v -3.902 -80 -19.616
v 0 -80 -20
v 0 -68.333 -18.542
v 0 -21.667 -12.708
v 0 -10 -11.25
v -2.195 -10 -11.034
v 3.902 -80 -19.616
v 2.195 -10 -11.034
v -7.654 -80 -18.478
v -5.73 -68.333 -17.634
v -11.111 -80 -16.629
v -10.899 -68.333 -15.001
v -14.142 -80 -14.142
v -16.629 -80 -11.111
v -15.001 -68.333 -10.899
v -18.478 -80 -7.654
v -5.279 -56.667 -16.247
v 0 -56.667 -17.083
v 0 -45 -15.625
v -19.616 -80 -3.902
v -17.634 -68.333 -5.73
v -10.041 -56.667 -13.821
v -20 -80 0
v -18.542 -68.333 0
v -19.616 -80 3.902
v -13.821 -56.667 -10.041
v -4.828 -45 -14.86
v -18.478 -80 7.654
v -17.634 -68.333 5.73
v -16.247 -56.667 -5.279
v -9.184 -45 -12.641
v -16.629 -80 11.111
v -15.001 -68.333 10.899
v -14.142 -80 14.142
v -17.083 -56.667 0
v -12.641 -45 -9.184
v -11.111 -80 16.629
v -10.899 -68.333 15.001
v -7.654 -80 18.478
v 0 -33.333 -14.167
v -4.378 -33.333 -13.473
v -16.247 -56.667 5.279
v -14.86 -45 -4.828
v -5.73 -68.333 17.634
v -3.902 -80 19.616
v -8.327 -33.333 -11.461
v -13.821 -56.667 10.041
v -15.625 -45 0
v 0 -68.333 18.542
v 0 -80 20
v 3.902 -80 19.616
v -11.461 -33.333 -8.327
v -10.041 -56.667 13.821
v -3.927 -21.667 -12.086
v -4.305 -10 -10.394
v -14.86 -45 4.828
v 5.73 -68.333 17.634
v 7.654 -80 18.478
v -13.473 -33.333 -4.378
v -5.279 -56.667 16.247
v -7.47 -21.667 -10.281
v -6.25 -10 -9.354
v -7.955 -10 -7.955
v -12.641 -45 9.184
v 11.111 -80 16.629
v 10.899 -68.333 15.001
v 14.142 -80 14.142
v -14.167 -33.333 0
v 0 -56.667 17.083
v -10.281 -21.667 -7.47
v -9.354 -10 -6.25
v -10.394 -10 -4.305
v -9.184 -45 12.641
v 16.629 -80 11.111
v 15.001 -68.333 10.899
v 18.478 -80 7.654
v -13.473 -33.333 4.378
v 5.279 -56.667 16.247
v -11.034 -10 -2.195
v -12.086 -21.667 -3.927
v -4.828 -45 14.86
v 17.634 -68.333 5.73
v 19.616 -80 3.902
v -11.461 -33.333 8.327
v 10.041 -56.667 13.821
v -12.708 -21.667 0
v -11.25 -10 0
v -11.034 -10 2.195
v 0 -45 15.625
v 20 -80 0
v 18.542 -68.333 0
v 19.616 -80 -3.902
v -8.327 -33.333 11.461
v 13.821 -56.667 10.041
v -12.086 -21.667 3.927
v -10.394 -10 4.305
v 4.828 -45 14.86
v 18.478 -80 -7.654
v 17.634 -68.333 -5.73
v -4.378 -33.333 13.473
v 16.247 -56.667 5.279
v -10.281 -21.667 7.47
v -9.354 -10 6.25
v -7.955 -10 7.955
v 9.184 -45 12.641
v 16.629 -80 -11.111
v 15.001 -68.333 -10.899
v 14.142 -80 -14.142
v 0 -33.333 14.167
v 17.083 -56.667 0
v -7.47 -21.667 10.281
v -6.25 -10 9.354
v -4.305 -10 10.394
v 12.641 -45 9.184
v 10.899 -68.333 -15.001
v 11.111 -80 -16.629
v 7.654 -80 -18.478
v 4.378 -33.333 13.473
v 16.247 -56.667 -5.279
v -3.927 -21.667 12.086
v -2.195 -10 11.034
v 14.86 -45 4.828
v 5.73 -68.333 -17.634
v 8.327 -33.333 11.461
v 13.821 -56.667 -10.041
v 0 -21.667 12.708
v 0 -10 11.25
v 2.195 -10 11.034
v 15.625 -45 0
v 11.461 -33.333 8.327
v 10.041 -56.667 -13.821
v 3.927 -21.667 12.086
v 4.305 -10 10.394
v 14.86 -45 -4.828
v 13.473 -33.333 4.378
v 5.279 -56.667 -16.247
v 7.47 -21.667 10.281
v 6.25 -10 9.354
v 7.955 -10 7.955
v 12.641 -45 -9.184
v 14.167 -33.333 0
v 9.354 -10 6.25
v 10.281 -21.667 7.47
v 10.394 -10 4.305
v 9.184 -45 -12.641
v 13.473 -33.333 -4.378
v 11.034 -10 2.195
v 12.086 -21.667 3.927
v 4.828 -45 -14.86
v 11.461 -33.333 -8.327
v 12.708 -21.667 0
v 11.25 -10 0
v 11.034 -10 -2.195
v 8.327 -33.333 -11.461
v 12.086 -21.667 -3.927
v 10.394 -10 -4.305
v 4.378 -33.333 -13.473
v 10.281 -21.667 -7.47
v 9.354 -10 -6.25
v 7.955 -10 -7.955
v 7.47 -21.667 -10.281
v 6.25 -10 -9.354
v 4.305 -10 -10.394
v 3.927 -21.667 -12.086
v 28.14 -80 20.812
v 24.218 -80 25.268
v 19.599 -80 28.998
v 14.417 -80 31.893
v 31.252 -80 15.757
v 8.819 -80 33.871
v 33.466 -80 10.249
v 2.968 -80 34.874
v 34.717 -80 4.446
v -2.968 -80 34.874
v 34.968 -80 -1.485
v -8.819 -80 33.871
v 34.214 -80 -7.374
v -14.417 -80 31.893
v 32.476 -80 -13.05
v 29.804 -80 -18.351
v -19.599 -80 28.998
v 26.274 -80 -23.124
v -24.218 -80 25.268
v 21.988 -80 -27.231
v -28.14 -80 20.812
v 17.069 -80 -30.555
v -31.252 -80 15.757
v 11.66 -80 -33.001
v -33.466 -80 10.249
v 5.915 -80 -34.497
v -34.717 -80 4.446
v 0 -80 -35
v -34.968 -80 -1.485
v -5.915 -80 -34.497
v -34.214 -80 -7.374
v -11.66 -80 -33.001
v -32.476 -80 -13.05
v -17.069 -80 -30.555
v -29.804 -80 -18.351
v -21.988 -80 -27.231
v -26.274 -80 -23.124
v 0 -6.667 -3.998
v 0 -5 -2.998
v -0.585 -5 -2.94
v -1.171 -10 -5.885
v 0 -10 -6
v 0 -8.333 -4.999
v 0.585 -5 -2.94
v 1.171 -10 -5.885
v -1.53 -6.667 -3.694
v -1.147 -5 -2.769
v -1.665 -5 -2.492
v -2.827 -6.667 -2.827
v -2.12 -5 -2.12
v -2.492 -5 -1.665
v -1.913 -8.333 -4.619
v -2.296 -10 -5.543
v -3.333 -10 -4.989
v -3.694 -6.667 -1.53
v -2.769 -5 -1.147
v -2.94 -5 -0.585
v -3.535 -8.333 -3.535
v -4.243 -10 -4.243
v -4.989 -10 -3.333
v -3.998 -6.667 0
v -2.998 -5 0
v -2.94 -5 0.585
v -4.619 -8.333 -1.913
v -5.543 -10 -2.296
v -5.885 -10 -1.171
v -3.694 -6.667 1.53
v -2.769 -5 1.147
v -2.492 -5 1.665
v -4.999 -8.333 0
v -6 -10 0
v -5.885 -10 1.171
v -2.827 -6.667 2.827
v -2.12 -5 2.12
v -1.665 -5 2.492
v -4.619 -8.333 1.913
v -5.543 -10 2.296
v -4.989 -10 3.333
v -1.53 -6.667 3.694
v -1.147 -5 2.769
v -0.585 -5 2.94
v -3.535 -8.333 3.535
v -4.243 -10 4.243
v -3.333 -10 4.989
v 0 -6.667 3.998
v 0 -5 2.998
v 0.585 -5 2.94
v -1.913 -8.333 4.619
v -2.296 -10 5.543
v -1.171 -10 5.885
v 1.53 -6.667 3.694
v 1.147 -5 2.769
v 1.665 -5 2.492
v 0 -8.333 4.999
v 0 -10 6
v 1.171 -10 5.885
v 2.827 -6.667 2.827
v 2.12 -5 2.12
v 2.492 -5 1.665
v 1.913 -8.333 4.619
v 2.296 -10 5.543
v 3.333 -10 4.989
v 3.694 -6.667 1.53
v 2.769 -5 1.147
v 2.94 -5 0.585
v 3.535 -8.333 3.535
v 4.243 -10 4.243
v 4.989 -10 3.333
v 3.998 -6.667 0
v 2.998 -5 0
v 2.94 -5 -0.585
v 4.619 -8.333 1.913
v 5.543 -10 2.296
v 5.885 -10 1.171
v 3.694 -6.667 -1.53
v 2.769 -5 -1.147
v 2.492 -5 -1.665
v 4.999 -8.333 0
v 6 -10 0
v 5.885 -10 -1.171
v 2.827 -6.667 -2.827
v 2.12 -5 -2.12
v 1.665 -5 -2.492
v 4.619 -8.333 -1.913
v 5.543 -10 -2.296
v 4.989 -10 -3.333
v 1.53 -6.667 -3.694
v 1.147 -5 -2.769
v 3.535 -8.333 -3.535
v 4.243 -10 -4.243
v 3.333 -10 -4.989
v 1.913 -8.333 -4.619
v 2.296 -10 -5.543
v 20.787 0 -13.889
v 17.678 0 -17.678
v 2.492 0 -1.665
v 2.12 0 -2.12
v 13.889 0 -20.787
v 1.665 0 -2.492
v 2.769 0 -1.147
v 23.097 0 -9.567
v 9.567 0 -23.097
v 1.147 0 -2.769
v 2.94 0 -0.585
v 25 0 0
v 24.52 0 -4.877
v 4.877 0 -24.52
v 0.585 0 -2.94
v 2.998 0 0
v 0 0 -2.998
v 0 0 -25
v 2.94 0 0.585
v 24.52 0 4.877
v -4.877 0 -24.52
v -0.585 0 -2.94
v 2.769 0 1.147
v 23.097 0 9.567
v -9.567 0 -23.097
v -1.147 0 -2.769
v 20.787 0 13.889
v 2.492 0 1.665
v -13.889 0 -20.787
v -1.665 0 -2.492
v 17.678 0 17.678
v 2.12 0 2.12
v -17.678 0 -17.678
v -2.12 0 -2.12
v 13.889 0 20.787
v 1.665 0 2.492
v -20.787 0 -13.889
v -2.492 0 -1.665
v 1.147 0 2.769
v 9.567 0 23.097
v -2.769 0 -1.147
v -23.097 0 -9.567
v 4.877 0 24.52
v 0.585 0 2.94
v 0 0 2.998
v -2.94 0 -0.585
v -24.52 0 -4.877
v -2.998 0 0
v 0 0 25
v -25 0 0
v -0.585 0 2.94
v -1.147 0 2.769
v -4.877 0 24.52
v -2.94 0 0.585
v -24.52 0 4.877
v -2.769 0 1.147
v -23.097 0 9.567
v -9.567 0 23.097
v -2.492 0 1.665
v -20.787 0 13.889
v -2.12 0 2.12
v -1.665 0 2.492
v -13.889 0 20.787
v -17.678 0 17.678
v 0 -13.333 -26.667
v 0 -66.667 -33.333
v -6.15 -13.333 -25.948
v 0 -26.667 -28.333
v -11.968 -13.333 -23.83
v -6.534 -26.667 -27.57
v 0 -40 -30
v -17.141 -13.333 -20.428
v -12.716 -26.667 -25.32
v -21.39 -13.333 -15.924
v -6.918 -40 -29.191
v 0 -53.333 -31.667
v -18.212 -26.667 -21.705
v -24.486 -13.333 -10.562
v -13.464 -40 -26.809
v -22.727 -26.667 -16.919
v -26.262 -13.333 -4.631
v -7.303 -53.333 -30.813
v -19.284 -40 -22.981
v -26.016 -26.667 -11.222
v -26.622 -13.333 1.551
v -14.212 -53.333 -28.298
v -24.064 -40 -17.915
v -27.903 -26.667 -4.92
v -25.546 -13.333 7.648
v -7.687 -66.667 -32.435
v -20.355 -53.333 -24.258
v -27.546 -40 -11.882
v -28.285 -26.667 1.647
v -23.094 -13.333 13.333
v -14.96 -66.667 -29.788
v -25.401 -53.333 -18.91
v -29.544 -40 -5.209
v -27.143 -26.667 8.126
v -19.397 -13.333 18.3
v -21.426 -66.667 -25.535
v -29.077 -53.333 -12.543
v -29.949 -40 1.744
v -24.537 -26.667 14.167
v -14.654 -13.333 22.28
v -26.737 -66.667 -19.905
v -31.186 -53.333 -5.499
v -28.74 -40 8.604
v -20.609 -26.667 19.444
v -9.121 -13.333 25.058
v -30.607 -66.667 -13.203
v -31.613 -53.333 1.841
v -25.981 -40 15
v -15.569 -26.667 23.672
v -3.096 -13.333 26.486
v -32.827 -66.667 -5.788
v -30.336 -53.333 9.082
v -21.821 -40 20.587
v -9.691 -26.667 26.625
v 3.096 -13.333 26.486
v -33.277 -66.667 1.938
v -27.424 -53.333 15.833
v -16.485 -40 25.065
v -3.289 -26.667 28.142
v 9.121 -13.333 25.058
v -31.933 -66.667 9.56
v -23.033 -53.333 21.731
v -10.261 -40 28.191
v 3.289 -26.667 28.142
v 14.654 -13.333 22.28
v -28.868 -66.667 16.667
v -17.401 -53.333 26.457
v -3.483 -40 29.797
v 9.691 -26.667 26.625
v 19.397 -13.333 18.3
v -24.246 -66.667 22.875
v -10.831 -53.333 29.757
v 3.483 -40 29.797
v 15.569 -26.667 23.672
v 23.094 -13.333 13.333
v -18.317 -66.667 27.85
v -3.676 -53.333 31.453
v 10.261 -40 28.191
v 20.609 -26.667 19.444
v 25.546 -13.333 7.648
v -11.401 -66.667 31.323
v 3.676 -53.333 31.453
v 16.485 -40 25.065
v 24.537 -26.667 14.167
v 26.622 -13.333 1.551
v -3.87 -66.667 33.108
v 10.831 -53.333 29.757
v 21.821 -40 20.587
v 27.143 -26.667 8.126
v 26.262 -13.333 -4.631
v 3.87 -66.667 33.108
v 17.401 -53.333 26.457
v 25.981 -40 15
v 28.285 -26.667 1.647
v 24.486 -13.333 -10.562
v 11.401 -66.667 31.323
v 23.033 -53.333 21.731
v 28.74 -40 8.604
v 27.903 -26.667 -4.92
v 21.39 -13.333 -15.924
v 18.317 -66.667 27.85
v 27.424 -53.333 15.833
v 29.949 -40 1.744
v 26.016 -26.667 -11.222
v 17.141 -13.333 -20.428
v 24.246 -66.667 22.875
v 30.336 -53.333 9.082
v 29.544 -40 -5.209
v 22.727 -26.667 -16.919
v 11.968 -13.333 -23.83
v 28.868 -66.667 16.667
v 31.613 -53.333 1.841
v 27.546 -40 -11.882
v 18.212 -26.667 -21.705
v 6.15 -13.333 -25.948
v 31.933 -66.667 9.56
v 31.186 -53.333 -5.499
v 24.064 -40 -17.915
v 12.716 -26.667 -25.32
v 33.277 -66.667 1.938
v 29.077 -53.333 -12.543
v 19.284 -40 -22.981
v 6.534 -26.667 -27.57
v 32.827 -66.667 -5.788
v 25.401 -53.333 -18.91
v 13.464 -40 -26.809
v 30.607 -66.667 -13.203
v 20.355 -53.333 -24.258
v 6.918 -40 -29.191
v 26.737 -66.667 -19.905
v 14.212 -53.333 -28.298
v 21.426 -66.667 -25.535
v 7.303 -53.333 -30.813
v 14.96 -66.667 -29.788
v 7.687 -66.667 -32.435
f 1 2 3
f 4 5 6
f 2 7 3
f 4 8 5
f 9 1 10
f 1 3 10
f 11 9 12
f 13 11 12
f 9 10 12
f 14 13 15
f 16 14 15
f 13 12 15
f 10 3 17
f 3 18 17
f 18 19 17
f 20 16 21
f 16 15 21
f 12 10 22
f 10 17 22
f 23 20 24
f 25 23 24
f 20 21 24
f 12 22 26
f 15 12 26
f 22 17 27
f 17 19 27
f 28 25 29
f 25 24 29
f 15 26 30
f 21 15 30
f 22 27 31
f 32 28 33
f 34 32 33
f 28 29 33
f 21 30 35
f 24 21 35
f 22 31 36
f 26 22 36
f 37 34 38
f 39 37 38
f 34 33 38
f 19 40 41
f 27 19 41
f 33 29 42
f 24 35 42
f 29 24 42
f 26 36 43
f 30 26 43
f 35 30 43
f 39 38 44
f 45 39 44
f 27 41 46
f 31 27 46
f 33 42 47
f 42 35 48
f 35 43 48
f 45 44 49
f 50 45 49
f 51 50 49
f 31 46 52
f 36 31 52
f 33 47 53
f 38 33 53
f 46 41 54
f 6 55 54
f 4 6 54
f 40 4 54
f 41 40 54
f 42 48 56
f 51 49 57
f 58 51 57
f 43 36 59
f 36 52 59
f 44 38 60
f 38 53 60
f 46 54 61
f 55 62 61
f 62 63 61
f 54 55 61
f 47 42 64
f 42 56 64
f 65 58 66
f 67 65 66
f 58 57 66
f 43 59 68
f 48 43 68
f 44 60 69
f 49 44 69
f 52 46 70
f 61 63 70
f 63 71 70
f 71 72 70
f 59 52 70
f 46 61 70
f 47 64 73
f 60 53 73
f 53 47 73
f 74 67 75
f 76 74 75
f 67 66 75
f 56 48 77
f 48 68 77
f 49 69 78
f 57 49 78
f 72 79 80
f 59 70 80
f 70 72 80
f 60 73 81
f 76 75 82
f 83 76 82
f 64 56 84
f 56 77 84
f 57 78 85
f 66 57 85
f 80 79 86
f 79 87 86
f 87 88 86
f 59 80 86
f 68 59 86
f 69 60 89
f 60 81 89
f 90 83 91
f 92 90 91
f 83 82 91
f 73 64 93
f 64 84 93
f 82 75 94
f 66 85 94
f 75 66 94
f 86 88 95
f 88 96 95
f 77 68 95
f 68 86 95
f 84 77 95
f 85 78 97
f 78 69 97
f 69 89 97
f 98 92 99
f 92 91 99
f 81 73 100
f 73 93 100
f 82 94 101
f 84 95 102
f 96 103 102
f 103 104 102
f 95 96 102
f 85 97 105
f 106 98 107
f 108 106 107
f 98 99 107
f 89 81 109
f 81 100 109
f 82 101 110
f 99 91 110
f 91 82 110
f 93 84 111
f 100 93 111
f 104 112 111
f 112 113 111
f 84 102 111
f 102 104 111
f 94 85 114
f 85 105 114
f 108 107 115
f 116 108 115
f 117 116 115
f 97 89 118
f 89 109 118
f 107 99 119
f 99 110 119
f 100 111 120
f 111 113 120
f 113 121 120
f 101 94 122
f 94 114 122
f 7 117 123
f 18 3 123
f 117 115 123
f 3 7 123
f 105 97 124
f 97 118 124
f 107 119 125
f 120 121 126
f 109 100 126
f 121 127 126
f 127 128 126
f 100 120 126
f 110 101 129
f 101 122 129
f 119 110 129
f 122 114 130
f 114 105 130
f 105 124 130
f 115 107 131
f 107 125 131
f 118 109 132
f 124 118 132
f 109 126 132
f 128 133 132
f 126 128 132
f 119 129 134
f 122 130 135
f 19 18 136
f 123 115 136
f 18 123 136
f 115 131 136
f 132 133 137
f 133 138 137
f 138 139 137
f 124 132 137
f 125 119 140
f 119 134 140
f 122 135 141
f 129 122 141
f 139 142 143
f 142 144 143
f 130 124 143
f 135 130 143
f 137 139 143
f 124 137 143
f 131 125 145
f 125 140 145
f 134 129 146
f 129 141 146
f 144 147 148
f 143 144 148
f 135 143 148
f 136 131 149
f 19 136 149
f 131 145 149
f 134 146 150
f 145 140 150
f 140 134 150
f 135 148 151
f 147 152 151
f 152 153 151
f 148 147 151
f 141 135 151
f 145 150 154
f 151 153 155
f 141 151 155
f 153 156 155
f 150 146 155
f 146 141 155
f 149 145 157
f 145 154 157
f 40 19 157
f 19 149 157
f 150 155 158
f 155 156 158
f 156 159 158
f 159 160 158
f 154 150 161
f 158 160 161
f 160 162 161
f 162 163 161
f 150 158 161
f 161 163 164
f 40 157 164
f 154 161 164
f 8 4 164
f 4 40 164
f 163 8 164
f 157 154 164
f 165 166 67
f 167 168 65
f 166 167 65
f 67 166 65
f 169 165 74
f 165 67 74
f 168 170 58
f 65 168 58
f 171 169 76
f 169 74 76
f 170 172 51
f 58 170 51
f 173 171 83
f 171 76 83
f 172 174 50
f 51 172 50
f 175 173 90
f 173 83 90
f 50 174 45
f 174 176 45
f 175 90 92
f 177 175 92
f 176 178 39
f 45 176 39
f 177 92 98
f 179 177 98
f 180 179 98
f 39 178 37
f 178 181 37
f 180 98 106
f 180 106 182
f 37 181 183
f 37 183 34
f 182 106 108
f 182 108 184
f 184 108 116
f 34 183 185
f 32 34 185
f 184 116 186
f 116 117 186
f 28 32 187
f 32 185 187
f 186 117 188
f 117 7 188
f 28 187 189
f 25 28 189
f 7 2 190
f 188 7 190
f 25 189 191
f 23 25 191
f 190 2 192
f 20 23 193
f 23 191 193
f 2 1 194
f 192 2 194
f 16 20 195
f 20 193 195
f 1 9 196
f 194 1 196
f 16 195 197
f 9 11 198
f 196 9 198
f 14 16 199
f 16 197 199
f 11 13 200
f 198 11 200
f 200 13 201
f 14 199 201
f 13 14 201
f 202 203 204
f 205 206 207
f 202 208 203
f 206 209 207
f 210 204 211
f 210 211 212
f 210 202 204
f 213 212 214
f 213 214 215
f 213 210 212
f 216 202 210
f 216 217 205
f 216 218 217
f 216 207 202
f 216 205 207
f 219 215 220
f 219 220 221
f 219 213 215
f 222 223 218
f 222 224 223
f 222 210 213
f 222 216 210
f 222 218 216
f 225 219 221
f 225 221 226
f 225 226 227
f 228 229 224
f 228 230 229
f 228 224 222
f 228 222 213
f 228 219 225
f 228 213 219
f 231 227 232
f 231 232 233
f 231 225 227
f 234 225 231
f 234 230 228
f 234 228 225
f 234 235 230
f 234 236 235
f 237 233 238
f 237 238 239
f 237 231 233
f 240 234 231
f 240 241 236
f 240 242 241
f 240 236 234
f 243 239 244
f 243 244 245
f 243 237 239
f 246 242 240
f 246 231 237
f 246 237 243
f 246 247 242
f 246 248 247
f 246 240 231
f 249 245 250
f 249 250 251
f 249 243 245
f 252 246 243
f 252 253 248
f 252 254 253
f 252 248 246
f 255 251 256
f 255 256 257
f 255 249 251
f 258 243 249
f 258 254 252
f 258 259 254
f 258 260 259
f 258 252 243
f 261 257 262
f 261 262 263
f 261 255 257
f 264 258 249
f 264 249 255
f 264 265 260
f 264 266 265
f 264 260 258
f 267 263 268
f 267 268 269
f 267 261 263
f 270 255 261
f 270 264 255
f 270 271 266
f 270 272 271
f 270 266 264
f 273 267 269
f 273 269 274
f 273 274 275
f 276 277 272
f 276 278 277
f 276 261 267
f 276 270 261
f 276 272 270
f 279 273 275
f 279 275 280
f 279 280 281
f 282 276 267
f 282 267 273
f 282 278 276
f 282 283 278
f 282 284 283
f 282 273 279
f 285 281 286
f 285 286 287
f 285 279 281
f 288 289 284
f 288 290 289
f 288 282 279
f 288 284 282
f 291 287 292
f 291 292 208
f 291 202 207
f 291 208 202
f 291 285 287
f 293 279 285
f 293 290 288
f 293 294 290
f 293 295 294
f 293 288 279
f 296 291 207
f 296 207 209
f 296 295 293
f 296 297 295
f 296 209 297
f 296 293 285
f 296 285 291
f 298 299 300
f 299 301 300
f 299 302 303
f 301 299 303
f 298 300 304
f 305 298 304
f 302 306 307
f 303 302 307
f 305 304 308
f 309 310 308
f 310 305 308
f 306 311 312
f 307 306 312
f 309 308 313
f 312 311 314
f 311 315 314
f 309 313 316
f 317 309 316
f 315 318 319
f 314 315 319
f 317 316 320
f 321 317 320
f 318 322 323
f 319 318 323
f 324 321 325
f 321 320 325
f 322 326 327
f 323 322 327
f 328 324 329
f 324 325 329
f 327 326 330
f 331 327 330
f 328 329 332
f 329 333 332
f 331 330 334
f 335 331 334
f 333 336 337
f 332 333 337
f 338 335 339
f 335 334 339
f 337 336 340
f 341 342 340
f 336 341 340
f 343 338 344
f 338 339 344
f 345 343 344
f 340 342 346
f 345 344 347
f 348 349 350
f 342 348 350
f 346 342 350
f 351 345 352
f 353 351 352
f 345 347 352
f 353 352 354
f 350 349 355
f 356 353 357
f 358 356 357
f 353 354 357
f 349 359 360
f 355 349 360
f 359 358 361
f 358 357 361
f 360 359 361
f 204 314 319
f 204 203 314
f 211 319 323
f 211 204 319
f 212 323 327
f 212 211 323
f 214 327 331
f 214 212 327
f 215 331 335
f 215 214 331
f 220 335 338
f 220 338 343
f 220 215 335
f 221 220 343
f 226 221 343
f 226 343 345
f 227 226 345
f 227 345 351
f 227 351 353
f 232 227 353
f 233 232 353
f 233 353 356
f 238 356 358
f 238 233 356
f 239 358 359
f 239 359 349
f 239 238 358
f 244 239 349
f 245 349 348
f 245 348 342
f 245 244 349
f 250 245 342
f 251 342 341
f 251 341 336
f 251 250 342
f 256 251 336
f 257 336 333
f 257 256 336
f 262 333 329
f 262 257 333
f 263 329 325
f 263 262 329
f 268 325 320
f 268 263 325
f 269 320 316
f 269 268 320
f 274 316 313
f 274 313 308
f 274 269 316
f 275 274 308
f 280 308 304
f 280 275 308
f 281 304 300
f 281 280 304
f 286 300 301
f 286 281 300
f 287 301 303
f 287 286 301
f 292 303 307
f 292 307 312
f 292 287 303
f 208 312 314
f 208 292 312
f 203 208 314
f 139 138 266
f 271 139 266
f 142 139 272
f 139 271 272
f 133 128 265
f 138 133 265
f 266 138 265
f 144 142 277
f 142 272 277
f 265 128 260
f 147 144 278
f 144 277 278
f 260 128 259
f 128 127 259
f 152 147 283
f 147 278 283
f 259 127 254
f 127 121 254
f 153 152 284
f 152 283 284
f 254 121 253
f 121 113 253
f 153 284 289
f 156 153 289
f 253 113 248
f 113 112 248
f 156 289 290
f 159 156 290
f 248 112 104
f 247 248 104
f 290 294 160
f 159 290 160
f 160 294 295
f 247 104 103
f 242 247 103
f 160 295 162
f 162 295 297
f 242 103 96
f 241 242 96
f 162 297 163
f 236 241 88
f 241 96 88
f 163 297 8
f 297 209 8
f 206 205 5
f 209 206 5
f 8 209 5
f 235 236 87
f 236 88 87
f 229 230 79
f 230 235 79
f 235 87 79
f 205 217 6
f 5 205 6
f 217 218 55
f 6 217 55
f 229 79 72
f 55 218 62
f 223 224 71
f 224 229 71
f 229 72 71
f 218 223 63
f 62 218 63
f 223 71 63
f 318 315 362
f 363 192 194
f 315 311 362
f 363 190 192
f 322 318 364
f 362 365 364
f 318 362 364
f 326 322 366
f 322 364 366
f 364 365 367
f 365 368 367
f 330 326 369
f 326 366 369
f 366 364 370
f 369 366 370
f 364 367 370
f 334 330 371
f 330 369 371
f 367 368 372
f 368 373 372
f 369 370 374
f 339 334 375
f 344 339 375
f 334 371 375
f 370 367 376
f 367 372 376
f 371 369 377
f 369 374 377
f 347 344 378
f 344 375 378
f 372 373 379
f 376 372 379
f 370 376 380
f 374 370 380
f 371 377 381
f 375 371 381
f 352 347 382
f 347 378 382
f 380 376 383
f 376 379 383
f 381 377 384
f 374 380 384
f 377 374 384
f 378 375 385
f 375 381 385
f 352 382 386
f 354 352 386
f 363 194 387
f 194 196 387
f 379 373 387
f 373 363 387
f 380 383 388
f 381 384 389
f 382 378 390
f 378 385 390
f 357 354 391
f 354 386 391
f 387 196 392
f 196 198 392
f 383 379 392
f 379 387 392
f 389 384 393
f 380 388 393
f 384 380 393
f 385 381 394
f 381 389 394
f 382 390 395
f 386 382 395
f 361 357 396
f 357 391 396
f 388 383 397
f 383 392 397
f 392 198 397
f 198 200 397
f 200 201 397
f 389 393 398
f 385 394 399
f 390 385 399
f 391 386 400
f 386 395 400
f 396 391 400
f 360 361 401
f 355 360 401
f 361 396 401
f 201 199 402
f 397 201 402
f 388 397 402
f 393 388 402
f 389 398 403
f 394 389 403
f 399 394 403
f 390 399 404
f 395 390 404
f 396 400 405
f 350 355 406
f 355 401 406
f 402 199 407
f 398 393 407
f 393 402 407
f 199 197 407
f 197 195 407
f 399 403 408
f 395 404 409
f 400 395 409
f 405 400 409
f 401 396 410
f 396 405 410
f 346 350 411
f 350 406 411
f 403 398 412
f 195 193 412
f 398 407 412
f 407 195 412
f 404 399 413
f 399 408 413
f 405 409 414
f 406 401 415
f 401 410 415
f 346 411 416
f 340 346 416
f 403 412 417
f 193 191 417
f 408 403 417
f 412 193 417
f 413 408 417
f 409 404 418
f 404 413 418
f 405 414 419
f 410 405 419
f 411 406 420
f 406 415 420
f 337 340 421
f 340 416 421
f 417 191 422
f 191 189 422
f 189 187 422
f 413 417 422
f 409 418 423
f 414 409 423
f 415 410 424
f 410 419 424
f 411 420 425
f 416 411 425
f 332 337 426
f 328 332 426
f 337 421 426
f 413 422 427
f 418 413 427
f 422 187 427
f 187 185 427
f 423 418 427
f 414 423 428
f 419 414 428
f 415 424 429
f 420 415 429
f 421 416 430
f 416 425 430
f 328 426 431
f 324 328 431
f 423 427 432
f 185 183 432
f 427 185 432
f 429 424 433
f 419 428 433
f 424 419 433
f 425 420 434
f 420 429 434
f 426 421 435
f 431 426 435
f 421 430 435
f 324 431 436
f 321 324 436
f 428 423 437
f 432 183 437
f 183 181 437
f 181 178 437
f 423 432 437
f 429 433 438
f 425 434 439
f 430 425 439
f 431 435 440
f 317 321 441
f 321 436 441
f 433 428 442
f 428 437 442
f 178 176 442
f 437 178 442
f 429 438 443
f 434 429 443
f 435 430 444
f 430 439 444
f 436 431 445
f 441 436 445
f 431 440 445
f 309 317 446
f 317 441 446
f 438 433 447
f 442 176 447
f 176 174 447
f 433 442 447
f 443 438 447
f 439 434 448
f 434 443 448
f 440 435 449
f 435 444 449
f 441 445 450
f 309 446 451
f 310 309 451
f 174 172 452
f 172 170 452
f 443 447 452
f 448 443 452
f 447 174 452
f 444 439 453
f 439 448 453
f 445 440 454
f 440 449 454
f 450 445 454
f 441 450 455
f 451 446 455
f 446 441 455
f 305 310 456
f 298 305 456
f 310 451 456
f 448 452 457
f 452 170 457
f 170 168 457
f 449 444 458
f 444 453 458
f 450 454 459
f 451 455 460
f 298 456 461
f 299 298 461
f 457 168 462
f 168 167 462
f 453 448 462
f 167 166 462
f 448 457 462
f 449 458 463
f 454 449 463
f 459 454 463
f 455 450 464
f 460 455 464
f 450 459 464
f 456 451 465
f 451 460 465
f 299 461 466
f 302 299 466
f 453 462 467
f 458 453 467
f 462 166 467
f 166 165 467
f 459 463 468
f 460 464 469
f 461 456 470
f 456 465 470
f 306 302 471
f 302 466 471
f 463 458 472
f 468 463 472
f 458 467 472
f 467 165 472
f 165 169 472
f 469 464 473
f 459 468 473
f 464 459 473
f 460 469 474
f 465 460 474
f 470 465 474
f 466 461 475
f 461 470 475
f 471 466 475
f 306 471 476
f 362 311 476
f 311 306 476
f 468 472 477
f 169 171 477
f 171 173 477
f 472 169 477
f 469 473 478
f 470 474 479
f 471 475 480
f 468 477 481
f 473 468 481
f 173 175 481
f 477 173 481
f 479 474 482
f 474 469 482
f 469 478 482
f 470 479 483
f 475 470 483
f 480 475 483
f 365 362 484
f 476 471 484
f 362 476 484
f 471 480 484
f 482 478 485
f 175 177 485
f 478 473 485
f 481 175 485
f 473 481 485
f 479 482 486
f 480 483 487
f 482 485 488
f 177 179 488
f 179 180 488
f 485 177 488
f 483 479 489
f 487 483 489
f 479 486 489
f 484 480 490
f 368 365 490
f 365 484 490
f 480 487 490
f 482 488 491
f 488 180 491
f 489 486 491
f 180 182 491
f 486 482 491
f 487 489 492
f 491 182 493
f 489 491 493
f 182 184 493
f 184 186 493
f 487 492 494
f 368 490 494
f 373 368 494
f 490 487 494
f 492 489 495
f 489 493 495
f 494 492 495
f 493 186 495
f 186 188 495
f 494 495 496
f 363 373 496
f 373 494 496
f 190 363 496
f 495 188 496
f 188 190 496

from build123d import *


with BuildPart() as part:
    # Croquis2 → Revolución1 (revolve)
    with BuildSketch(Plane(origin=(0, 0, 0), x_dir=(0, 0, -1), z_dir=(1, 0, 0))):
        Polygon((0, 0), (25, 0), (35, -80), (20, -80), (11.25, -10), (0, -10), align=None)
    revolve(axis=Axis((0, -10, 0), (0, 1, 0)))

    # Croquis5 → Cortar-Revolución1 (revolve, cut)
    with BuildSketch(Plane(origin=(0, 0, 0), x_dir=(0, 0, -1), z_dir=(1, 0, 0))):
        Polygon((0, -10), (0, 0), (2.997515389, 0), (2.997515389, -5), (6, -10), align=None)
    revolve(axis=Axis((0, -10, 0), (0, 1, 0)), mode=Mode.SUBTRACT)


solid = part.part
